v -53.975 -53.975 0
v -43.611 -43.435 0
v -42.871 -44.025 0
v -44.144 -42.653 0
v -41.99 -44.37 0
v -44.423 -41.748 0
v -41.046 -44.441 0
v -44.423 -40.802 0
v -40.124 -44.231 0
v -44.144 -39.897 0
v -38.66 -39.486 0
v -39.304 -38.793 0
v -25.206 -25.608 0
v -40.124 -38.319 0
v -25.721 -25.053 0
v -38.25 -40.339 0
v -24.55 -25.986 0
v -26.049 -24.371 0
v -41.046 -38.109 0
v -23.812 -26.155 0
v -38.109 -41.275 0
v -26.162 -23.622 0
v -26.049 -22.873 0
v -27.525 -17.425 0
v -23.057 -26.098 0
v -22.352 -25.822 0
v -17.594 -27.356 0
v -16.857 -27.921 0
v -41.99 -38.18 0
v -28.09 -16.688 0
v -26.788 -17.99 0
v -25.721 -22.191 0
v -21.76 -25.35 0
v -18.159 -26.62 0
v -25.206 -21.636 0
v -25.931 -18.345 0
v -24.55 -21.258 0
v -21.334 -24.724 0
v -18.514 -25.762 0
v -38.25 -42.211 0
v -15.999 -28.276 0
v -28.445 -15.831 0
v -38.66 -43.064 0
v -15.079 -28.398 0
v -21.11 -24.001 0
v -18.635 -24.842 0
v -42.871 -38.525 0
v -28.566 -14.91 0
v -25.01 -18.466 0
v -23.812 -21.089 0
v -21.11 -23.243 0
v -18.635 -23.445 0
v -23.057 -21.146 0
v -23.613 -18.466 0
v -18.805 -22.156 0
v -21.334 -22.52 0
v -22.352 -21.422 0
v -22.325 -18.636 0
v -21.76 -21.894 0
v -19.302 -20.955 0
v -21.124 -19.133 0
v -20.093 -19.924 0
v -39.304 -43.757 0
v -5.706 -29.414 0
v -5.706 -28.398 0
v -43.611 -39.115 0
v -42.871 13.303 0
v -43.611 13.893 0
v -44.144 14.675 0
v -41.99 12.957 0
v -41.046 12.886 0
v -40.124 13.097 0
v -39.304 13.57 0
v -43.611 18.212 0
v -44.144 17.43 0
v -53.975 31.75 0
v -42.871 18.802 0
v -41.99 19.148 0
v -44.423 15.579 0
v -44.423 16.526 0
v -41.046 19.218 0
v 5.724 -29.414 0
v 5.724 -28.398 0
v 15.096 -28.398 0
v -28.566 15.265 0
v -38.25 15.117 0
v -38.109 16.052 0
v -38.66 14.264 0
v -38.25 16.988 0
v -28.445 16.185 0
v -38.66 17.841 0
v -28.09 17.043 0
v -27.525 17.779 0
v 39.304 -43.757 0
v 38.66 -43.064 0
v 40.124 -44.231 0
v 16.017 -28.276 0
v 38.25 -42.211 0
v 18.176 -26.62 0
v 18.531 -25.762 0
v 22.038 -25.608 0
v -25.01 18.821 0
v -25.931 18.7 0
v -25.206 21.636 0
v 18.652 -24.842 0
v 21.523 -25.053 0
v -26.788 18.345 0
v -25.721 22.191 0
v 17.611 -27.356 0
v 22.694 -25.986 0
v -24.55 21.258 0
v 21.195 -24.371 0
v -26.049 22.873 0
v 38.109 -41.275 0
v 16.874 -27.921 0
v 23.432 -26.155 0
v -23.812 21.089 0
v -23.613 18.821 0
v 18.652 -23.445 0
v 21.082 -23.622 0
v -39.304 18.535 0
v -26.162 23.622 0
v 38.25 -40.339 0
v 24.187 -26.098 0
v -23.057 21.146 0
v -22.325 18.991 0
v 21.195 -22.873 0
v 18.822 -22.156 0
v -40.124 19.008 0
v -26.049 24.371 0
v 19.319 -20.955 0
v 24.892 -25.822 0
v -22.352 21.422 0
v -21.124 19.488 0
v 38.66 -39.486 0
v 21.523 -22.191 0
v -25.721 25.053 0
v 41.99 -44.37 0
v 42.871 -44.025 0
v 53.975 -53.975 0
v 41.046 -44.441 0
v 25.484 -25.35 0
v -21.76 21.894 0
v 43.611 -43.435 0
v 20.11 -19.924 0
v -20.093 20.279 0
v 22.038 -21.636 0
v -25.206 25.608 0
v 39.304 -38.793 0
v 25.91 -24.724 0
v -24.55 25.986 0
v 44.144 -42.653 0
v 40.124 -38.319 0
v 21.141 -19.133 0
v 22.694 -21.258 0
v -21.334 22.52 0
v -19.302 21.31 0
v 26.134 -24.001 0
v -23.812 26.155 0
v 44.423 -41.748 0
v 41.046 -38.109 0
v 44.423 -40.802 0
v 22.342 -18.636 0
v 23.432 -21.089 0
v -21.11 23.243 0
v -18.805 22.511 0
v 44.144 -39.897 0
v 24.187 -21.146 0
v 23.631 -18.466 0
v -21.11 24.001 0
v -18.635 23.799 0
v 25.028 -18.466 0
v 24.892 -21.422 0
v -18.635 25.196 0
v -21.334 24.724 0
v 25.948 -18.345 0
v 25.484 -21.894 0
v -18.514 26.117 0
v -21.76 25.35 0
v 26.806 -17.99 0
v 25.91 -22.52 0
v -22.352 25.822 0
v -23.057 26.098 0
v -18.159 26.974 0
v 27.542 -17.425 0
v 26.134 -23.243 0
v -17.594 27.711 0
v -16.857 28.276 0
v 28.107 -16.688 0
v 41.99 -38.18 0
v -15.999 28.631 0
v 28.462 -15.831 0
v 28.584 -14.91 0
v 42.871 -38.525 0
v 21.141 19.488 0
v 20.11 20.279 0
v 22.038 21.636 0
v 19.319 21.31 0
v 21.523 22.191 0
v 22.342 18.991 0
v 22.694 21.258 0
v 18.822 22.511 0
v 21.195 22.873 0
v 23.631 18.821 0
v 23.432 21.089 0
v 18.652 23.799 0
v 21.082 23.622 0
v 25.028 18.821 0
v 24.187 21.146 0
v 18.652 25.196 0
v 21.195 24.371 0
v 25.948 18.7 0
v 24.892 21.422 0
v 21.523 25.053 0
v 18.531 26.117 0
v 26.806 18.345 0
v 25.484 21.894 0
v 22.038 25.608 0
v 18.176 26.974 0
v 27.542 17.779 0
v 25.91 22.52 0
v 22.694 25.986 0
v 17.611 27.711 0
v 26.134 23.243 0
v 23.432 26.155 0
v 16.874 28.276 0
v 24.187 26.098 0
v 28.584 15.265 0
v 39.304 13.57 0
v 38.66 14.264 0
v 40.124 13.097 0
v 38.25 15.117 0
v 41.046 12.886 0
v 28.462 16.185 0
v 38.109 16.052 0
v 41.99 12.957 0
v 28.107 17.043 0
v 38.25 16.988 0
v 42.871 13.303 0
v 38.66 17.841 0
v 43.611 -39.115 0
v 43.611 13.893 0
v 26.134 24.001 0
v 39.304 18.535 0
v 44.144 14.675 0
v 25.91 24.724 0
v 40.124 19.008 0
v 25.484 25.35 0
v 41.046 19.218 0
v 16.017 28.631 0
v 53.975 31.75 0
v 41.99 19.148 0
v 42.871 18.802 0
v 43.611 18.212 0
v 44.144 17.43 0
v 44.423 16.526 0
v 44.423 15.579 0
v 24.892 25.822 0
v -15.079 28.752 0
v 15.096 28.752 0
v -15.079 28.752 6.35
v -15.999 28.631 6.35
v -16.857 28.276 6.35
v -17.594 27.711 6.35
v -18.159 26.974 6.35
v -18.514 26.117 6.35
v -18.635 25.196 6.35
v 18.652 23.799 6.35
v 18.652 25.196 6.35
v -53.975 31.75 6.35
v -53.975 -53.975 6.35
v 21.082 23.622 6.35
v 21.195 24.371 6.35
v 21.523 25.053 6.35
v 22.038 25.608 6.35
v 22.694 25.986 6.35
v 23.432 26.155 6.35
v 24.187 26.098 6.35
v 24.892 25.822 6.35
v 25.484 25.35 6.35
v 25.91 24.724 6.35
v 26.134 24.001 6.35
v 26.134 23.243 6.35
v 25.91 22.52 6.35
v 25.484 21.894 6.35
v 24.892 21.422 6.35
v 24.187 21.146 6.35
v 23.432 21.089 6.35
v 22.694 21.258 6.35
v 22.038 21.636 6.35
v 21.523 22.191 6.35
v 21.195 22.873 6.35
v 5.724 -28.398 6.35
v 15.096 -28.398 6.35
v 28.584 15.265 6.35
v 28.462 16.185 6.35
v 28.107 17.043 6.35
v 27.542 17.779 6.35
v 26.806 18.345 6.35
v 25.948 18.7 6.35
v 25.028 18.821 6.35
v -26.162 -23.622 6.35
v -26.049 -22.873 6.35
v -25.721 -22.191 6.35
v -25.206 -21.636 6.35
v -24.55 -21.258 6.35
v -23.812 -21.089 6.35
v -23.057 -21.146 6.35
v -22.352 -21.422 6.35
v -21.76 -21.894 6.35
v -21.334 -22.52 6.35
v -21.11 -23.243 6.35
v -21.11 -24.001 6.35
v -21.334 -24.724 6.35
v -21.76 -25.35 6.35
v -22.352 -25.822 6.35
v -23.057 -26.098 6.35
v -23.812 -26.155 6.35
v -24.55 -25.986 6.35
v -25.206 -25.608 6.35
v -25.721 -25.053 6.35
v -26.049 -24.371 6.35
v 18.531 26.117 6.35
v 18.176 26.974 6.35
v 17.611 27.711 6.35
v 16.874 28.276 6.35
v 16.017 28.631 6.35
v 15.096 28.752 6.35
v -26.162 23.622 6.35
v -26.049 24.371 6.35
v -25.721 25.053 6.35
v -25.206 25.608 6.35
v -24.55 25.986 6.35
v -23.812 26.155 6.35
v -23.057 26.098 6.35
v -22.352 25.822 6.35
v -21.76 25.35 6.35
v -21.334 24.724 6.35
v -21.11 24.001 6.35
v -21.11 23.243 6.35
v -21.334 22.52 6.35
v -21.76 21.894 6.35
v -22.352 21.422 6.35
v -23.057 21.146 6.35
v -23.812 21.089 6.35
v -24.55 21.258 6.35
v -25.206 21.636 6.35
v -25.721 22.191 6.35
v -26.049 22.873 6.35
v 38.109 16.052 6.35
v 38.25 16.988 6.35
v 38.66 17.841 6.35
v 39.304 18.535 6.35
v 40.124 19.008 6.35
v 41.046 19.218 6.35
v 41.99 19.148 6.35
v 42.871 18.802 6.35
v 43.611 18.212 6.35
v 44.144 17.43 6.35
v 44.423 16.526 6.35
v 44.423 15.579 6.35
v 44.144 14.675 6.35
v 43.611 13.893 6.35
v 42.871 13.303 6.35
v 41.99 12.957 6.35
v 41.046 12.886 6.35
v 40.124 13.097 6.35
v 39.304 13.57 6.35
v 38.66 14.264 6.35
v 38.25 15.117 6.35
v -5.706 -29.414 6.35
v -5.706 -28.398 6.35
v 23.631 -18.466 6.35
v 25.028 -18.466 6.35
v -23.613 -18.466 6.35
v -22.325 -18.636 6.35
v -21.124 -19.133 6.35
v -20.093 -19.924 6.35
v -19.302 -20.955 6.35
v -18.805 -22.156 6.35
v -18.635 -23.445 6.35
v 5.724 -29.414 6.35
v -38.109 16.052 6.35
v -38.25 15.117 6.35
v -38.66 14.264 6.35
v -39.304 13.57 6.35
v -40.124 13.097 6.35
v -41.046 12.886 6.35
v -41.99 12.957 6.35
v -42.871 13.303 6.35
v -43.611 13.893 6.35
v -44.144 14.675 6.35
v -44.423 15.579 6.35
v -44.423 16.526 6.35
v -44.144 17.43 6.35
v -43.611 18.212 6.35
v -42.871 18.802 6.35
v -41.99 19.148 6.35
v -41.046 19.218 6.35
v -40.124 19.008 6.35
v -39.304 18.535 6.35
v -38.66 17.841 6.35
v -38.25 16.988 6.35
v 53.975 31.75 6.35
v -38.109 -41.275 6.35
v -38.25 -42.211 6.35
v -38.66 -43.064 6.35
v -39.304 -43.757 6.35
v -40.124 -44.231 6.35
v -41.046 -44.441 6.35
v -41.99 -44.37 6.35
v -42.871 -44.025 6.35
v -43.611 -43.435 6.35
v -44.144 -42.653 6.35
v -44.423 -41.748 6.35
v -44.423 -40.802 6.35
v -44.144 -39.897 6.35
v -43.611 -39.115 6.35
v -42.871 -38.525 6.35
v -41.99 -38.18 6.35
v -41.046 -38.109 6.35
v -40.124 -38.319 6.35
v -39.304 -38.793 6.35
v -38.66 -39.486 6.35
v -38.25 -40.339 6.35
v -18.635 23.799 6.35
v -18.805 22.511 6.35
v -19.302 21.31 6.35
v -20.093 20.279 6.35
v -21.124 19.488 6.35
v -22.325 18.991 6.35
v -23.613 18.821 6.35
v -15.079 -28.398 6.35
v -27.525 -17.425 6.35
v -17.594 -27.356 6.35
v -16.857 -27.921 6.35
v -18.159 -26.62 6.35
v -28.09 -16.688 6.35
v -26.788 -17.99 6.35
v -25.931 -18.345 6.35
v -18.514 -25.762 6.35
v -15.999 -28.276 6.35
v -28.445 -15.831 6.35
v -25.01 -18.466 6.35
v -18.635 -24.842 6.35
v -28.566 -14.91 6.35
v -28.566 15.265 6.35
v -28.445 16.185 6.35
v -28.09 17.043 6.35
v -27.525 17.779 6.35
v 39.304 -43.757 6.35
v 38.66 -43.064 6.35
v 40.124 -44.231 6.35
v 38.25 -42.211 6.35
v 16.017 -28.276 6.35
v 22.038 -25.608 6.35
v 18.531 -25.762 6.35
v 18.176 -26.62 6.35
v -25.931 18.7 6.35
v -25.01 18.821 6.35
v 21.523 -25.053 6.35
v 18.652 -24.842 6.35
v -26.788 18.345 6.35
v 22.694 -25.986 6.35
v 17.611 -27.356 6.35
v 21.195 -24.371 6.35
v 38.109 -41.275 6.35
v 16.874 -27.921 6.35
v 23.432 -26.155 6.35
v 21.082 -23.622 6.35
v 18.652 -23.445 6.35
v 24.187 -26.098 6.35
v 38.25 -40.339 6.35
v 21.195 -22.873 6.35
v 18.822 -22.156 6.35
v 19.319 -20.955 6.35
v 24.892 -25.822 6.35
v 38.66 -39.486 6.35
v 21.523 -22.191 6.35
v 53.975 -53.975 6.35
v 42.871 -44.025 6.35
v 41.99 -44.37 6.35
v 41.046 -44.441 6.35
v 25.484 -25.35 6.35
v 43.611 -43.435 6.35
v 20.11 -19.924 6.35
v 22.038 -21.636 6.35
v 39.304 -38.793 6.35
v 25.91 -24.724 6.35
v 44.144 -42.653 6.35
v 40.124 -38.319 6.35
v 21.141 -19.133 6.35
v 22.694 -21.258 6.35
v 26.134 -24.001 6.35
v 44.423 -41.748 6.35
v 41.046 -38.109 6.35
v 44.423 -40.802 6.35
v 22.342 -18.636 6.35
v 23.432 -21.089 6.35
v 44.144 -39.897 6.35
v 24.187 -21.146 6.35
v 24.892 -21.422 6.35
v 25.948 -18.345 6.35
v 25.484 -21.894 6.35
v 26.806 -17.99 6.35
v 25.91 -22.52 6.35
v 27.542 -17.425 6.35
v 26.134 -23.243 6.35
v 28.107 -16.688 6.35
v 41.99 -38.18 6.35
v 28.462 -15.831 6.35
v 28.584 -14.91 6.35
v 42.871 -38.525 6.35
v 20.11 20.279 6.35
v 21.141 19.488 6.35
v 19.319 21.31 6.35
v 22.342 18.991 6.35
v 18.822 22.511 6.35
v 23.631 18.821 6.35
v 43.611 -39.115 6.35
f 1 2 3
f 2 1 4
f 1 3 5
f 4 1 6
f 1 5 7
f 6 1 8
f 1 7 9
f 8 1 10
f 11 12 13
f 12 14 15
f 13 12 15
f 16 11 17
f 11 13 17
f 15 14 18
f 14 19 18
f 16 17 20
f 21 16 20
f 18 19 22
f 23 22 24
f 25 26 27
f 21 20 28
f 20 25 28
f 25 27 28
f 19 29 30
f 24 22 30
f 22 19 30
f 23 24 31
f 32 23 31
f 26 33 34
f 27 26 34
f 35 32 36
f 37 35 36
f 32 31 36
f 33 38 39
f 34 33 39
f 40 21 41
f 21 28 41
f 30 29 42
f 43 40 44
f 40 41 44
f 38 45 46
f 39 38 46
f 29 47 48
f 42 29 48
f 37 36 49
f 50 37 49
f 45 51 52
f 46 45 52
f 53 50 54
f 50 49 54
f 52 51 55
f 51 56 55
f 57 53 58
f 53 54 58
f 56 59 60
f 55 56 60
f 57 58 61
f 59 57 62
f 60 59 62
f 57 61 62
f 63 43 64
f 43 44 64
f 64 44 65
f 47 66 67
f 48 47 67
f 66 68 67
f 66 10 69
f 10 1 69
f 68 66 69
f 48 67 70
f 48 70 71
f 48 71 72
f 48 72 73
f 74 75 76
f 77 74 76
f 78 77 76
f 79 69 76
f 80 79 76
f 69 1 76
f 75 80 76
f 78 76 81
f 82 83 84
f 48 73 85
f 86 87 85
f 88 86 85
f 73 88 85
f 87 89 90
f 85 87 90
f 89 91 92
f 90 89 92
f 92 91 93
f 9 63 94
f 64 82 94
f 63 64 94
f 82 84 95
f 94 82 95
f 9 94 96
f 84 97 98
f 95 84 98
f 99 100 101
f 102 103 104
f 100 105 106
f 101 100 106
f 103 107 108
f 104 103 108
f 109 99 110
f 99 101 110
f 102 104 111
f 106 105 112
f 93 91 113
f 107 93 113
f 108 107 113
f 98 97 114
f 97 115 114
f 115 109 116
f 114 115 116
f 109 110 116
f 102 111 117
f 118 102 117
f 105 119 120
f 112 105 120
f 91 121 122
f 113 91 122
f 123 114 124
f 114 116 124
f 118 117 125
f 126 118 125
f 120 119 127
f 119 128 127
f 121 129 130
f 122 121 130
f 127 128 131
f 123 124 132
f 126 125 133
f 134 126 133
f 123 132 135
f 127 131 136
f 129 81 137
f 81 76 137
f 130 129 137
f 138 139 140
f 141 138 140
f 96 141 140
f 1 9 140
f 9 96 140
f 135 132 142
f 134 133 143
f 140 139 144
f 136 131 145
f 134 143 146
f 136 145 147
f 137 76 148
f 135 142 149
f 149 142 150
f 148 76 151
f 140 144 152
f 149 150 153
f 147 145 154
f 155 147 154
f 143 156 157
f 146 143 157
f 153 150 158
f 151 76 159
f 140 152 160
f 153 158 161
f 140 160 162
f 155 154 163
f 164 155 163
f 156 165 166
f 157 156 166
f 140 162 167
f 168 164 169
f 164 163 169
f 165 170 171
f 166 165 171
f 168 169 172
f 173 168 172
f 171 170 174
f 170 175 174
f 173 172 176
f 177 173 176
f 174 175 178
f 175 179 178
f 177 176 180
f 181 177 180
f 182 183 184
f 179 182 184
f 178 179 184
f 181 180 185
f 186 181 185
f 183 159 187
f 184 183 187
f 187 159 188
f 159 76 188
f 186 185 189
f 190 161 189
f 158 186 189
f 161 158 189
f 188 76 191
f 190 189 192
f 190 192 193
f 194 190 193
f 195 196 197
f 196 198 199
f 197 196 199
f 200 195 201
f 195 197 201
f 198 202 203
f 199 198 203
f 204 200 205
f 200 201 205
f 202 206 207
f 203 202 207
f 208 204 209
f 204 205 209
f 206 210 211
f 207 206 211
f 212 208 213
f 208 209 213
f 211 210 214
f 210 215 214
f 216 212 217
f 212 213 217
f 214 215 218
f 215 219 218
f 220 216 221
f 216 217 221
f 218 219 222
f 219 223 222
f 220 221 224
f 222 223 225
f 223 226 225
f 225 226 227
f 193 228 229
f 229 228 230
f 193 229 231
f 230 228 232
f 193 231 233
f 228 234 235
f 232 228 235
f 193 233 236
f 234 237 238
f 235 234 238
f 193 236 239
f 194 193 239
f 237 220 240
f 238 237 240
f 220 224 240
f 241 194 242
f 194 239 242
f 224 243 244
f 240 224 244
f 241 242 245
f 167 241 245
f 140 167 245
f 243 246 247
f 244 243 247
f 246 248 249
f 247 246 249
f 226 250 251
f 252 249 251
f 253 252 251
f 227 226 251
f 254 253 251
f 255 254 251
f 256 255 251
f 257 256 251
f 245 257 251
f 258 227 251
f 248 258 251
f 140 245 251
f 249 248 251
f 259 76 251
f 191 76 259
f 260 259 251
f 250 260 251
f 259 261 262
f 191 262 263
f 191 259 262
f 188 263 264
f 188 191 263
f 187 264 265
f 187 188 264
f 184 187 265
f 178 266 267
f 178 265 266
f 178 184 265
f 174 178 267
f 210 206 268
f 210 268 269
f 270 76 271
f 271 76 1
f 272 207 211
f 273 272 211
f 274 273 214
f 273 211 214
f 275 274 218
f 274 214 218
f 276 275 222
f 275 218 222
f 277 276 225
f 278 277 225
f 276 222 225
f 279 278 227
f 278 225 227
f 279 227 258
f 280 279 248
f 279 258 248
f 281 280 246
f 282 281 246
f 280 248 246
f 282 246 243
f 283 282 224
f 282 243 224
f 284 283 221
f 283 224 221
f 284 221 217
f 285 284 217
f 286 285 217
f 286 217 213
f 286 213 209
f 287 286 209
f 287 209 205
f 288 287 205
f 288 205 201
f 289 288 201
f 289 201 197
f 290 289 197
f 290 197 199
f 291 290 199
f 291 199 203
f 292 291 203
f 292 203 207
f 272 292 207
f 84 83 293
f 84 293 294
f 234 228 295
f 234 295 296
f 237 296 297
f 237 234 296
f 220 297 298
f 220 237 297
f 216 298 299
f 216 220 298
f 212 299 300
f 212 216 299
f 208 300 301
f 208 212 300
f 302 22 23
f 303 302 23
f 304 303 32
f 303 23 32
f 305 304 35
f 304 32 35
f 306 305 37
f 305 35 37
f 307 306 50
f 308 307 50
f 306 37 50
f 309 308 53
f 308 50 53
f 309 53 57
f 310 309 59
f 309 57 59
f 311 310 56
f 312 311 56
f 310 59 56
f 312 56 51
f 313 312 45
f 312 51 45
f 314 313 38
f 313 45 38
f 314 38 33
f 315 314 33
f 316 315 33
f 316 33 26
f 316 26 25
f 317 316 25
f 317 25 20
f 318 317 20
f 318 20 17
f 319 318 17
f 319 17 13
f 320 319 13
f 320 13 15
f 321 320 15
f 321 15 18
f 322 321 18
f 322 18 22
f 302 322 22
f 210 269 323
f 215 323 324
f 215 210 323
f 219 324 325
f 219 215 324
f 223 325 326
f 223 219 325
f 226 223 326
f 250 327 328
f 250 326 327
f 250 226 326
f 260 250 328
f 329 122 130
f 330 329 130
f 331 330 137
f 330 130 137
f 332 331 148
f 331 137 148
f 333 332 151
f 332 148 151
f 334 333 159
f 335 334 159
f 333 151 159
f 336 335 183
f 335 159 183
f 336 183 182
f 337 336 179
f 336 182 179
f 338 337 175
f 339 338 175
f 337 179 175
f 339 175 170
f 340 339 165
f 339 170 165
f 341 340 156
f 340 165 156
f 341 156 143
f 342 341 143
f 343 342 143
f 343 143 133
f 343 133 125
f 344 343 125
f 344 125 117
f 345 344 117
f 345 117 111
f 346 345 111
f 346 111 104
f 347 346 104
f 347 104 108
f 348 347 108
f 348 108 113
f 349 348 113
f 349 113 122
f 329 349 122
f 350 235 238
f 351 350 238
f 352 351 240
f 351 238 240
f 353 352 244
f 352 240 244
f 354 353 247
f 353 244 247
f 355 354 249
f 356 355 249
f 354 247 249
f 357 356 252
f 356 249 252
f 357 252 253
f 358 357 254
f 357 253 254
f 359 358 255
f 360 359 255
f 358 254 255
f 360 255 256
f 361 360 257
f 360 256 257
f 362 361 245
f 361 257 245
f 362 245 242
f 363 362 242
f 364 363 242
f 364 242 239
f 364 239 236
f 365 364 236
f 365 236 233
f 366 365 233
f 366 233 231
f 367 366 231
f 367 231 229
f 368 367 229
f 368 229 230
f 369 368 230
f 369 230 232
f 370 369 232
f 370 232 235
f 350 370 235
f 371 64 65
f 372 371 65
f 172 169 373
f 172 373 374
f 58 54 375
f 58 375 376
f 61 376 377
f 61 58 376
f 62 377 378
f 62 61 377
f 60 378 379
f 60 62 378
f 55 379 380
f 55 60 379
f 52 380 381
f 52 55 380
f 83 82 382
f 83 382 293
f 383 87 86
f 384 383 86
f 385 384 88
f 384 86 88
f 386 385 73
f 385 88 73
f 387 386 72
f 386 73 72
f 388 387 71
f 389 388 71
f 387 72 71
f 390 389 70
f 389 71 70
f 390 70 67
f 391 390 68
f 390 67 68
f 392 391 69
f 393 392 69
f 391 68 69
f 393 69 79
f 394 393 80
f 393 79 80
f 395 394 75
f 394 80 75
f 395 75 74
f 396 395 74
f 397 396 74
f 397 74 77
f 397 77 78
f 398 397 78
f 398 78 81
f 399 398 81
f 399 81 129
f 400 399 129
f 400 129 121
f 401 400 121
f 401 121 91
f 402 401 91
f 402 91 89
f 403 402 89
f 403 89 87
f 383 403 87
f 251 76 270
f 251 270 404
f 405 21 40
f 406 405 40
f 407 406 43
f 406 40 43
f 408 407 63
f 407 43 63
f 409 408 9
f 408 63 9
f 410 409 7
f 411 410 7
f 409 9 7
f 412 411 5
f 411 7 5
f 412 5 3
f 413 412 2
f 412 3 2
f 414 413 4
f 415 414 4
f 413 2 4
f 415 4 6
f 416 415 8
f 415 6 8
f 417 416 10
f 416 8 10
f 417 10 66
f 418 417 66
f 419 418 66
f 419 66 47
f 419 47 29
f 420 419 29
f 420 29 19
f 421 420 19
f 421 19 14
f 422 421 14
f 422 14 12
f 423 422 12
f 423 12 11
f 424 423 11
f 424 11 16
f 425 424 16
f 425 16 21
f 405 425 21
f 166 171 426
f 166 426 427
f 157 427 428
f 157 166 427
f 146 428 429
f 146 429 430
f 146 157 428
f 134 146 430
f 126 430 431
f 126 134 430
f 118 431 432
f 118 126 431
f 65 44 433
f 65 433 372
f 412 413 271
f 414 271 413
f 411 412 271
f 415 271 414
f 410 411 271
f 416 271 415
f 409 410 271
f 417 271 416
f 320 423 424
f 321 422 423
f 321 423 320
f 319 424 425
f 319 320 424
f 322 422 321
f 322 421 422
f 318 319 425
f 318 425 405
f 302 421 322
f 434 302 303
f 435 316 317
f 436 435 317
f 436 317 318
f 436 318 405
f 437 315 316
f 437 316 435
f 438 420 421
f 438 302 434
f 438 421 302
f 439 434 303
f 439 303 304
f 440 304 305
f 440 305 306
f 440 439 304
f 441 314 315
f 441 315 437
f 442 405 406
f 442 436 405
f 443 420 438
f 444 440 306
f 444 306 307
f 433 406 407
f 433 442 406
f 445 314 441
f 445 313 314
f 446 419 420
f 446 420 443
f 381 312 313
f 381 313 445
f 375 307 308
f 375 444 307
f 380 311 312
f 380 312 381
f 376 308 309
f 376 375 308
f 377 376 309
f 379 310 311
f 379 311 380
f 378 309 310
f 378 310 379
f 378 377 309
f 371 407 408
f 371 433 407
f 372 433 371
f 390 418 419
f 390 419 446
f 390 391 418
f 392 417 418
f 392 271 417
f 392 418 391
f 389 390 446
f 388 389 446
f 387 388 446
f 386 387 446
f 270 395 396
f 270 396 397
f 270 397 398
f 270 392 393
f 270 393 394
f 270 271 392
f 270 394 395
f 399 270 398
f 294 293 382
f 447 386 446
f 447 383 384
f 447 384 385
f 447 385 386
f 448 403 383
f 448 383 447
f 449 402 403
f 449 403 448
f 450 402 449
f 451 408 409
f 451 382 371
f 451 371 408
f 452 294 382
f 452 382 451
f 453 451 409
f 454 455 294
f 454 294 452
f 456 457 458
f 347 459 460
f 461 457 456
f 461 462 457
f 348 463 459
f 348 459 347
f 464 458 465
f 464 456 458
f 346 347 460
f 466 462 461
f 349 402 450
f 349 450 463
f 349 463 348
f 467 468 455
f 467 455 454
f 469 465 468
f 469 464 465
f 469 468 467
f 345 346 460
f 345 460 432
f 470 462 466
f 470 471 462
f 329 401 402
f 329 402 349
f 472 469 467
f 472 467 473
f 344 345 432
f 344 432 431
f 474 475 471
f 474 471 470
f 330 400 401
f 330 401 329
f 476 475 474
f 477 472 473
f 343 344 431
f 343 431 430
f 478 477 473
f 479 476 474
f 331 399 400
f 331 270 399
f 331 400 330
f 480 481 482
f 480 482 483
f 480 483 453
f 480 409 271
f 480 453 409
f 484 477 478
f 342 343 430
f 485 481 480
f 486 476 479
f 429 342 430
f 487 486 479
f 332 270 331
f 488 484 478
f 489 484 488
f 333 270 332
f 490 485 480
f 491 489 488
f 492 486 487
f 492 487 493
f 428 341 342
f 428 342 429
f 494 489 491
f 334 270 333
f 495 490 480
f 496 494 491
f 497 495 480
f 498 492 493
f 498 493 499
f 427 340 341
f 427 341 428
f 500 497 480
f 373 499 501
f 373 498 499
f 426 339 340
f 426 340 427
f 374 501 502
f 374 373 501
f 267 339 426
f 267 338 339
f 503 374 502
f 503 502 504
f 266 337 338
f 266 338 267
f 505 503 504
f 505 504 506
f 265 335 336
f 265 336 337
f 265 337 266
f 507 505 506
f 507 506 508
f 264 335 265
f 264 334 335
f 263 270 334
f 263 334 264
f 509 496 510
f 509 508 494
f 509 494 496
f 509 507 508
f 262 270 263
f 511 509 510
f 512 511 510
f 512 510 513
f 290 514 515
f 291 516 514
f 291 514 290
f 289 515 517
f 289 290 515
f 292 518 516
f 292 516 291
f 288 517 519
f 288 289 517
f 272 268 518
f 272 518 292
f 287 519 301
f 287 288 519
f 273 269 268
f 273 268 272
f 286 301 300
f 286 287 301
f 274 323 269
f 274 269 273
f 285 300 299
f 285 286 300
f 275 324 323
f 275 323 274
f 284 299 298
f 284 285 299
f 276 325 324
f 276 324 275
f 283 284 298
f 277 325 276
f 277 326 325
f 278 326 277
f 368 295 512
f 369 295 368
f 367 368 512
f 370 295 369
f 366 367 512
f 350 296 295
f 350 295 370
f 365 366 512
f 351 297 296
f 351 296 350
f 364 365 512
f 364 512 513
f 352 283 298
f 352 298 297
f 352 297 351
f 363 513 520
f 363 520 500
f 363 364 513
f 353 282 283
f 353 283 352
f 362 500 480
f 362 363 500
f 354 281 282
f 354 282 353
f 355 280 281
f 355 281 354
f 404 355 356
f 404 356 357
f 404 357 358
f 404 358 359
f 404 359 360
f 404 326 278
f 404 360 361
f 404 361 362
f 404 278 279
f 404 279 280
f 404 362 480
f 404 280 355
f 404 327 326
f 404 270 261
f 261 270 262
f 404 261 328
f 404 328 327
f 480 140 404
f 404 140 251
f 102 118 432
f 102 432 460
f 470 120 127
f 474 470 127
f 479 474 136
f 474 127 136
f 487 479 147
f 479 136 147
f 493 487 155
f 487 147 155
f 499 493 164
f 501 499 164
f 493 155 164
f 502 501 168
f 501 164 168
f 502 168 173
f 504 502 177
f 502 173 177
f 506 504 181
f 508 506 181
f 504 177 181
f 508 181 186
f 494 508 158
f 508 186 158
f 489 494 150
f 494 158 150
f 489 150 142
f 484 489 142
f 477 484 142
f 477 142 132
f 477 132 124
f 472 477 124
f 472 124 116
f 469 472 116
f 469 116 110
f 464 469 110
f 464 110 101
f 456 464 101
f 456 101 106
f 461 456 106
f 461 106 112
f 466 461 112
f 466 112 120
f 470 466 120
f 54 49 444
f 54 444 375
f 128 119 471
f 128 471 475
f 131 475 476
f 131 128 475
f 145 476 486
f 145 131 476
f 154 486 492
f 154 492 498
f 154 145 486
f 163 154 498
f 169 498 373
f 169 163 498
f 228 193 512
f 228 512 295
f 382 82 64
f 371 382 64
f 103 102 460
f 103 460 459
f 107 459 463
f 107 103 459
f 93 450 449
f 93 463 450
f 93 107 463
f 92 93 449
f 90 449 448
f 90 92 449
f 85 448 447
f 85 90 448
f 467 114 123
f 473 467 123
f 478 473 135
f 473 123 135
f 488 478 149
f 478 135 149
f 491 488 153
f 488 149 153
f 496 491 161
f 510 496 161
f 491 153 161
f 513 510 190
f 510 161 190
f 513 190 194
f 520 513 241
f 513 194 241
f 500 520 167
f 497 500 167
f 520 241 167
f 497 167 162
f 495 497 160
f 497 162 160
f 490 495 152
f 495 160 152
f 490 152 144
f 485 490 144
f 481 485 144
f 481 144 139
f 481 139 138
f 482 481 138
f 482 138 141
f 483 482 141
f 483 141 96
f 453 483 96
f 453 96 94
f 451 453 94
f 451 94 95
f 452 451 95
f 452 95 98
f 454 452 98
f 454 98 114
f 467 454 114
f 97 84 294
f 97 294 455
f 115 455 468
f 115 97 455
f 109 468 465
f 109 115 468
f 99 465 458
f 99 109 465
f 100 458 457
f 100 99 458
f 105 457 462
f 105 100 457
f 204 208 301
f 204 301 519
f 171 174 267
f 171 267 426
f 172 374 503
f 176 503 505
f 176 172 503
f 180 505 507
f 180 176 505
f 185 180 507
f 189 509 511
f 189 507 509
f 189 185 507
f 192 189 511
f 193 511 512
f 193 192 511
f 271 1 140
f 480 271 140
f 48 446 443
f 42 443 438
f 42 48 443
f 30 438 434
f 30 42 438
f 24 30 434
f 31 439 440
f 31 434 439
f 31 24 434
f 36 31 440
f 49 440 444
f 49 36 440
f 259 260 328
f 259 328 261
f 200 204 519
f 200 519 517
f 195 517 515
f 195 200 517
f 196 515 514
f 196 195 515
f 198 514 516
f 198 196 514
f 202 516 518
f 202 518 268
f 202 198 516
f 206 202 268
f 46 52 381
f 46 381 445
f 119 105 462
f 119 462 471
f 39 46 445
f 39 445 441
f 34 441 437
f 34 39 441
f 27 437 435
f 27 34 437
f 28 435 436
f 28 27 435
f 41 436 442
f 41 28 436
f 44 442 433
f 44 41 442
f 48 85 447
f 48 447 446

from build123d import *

# Parameters (mm, degrees)
SKETCH1_W           = 107.95
SKETCH1_H           = 31.75
SKETCH1_H_2         = 53.975
BOSS_EXTRUDE1_DEPTH = 6.35
SKETCH11_R          = 2.54
CUT_EXTRUDE2_DEPTH  = 7.62
SKETCH12_W          = 11.43
SKETCH12_H          = 1.016
CUT_EXTRUDE3_DEPTH  = 7.62
SKETCH13_R          = 3.175
CUT_EXTRUDE4_DEPTH  = 7.62


with BuildPart() as part:
    # Sketch1 → Boss-Extrude1 (new body)
    with BuildSketch(Plane.XY):
        with Locations((0, 15.875)):
            Rectangle(SKETCH1_W, SKETCH1_H)
        with Locations((0, -26.9875)):
            Rectangle(SKETCH1_W, SKETCH1_H_2)
    extrude(amount=BOSS_EXTRUDE1_DEPTH)

    # Sketch11 → Cut-Extrude2 (cut)
    with BuildSketch(Plane(origin=(0, 0, 0), x_dir=(-1, 0, 0), z_dir=(0, 0, -1))):
        with Locations((23.622, -23.622)):
            Circle(SKETCH11_R)
        with Locations((-23.622, -23.622)):
            Circle(SKETCH11_R)
        with Locations((-23.622, 23.622)):
            Circle(SKETCH11_R)
        with Locations((23.622, 23.622)):
            Circle(SKETCH11_R)
    extrude(amount=-CUT_EXTRUDE2_DEPTH, mode=Mode.SUBTRACT)

    # Sketch12 → Cut-Extrude3 (cut)
    with BuildSketch(Plane(origin=(0, 0, 0), x_dir=(-1, 0, 0), z_dir=(0, 0, -1))):
        with BuildLine():
            ThreePointArc((-25.027545804, -18.46622785), (-27.542017518, -17.424699564), (-28.583545804, -14.91022785))
            Line((-28.583545804, -14.91022785), (-28.583545804, 15.26497215))
            ThreePointArc((-28.583545804, 15.26497215), (-27.542017518, 17.779443863), (-25.027545804, 18.82097215))
            Line((-25.027545804, 18.82097215), (-23.630545804, 18.82097215))
            ThreePointArc((-23.630545804, 18.82097215), (-20.110285404, 20.27911175), (-18.652145804, 23.79937215))
            Line((-18.652145804, 23.79937215), (-18.652145804, 25.19637215))
            ThreePointArc((-18.652145804, 25.19637215), (-17.610617518, 27.710843863), (-15.096145804, 28.75237215))
            Line((-15.096145804, 28.75237215), (15.079054196, 28.75237215))
            ThreePointArc((15.079054196, 28.75237215), (17.59352591, 27.710843863), (18.635054196, 25.19637215))
            Line((18.635054196, 25.19637215), (18.635054196, 23.79937215))
            ThreePointArc((18.635054196, 23.79937215), (20.093193797, 20.27911175), (23.613454196, 18.82097215))
            Line((23.613454196, 18.82097215), (25.010454196, 18.82097215))
            ThreePointArc((25.010454196, 18.82097215), (27.52492591, 17.779443863), (28.566454196, 15.26497215))
            Line((28.566454196, 15.26497215), (28.566454196, -14.91022785))
            ThreePointArc((28.566454196, -14.91022785), (27.52492591, -17.424699564), (25.010454196, -18.46622785))
            Line((25.010454196, -18.46622785), (23.613454196, -18.46622785))
            ThreePointArc((23.613454196, -18.46622785), (20.093193797, -19.924367451), (18.635054196, -23.44462785))
            Line((18.635054196, -23.44462785), (18.635054196, -24.84162785))
            ThreePointArc((18.635054196, -24.84162785), (17.59352591, -27.356099564), (15.079054196, -28.39762785))
            Line((15.079054196, -28.39762785), (-15.096145804, -28.39762785))
            ThreePointArc((-15.096145804, -28.39762785), (-17.610617518, -27.356099564), (-18.652145804, -24.84162785))
            Line((-18.652145804, -24.84162785), (-18.652145804, -23.44462785))
            ThreePointArc((-18.652145804, -23.44462785), (-20.110285404, -19.924367451), (-23.630545804, -18.46622785))
            Line((-23.630545804, -18.46622785), (-25.027545804, -18.46622785))
        make_face()
        with Locations((-0.008545804, -28.90562785)):
            Rectangle(SKETCH12_W, SKETCH12_H)
    extrude(amount=-CUT_EXTRUDE3_DEPTH, mode=Mode.SUBTRACT)

    # Sketch13 → Cut-Extrude4 (cut)
    with BuildSketch(Plane(origin=(0, 0, 0), x_dir=(-1, 0, 0), z_dir=(0, 0, -1))):
        with Locations((-41.283545804, 16.05237215)):
            Circle(SKETCH13_R)
        with Locations((-41.283545804, -41.275)):
            Circle(SKETCH13_R)
        with Locations(Location((41.283545804, -41.275, 0), (0, 0, 180))):
            Circle(SKETCH13_R)
        with Locations(Location((41.283545804, 16.05237215, 0), (0, 0, 180))):
            Circle(SKETCH13_R)
    extrude(amount=-CUT_EXTRUDE4_DEPTH, mode=Mode.SUBTRACT)


solid = part.part
